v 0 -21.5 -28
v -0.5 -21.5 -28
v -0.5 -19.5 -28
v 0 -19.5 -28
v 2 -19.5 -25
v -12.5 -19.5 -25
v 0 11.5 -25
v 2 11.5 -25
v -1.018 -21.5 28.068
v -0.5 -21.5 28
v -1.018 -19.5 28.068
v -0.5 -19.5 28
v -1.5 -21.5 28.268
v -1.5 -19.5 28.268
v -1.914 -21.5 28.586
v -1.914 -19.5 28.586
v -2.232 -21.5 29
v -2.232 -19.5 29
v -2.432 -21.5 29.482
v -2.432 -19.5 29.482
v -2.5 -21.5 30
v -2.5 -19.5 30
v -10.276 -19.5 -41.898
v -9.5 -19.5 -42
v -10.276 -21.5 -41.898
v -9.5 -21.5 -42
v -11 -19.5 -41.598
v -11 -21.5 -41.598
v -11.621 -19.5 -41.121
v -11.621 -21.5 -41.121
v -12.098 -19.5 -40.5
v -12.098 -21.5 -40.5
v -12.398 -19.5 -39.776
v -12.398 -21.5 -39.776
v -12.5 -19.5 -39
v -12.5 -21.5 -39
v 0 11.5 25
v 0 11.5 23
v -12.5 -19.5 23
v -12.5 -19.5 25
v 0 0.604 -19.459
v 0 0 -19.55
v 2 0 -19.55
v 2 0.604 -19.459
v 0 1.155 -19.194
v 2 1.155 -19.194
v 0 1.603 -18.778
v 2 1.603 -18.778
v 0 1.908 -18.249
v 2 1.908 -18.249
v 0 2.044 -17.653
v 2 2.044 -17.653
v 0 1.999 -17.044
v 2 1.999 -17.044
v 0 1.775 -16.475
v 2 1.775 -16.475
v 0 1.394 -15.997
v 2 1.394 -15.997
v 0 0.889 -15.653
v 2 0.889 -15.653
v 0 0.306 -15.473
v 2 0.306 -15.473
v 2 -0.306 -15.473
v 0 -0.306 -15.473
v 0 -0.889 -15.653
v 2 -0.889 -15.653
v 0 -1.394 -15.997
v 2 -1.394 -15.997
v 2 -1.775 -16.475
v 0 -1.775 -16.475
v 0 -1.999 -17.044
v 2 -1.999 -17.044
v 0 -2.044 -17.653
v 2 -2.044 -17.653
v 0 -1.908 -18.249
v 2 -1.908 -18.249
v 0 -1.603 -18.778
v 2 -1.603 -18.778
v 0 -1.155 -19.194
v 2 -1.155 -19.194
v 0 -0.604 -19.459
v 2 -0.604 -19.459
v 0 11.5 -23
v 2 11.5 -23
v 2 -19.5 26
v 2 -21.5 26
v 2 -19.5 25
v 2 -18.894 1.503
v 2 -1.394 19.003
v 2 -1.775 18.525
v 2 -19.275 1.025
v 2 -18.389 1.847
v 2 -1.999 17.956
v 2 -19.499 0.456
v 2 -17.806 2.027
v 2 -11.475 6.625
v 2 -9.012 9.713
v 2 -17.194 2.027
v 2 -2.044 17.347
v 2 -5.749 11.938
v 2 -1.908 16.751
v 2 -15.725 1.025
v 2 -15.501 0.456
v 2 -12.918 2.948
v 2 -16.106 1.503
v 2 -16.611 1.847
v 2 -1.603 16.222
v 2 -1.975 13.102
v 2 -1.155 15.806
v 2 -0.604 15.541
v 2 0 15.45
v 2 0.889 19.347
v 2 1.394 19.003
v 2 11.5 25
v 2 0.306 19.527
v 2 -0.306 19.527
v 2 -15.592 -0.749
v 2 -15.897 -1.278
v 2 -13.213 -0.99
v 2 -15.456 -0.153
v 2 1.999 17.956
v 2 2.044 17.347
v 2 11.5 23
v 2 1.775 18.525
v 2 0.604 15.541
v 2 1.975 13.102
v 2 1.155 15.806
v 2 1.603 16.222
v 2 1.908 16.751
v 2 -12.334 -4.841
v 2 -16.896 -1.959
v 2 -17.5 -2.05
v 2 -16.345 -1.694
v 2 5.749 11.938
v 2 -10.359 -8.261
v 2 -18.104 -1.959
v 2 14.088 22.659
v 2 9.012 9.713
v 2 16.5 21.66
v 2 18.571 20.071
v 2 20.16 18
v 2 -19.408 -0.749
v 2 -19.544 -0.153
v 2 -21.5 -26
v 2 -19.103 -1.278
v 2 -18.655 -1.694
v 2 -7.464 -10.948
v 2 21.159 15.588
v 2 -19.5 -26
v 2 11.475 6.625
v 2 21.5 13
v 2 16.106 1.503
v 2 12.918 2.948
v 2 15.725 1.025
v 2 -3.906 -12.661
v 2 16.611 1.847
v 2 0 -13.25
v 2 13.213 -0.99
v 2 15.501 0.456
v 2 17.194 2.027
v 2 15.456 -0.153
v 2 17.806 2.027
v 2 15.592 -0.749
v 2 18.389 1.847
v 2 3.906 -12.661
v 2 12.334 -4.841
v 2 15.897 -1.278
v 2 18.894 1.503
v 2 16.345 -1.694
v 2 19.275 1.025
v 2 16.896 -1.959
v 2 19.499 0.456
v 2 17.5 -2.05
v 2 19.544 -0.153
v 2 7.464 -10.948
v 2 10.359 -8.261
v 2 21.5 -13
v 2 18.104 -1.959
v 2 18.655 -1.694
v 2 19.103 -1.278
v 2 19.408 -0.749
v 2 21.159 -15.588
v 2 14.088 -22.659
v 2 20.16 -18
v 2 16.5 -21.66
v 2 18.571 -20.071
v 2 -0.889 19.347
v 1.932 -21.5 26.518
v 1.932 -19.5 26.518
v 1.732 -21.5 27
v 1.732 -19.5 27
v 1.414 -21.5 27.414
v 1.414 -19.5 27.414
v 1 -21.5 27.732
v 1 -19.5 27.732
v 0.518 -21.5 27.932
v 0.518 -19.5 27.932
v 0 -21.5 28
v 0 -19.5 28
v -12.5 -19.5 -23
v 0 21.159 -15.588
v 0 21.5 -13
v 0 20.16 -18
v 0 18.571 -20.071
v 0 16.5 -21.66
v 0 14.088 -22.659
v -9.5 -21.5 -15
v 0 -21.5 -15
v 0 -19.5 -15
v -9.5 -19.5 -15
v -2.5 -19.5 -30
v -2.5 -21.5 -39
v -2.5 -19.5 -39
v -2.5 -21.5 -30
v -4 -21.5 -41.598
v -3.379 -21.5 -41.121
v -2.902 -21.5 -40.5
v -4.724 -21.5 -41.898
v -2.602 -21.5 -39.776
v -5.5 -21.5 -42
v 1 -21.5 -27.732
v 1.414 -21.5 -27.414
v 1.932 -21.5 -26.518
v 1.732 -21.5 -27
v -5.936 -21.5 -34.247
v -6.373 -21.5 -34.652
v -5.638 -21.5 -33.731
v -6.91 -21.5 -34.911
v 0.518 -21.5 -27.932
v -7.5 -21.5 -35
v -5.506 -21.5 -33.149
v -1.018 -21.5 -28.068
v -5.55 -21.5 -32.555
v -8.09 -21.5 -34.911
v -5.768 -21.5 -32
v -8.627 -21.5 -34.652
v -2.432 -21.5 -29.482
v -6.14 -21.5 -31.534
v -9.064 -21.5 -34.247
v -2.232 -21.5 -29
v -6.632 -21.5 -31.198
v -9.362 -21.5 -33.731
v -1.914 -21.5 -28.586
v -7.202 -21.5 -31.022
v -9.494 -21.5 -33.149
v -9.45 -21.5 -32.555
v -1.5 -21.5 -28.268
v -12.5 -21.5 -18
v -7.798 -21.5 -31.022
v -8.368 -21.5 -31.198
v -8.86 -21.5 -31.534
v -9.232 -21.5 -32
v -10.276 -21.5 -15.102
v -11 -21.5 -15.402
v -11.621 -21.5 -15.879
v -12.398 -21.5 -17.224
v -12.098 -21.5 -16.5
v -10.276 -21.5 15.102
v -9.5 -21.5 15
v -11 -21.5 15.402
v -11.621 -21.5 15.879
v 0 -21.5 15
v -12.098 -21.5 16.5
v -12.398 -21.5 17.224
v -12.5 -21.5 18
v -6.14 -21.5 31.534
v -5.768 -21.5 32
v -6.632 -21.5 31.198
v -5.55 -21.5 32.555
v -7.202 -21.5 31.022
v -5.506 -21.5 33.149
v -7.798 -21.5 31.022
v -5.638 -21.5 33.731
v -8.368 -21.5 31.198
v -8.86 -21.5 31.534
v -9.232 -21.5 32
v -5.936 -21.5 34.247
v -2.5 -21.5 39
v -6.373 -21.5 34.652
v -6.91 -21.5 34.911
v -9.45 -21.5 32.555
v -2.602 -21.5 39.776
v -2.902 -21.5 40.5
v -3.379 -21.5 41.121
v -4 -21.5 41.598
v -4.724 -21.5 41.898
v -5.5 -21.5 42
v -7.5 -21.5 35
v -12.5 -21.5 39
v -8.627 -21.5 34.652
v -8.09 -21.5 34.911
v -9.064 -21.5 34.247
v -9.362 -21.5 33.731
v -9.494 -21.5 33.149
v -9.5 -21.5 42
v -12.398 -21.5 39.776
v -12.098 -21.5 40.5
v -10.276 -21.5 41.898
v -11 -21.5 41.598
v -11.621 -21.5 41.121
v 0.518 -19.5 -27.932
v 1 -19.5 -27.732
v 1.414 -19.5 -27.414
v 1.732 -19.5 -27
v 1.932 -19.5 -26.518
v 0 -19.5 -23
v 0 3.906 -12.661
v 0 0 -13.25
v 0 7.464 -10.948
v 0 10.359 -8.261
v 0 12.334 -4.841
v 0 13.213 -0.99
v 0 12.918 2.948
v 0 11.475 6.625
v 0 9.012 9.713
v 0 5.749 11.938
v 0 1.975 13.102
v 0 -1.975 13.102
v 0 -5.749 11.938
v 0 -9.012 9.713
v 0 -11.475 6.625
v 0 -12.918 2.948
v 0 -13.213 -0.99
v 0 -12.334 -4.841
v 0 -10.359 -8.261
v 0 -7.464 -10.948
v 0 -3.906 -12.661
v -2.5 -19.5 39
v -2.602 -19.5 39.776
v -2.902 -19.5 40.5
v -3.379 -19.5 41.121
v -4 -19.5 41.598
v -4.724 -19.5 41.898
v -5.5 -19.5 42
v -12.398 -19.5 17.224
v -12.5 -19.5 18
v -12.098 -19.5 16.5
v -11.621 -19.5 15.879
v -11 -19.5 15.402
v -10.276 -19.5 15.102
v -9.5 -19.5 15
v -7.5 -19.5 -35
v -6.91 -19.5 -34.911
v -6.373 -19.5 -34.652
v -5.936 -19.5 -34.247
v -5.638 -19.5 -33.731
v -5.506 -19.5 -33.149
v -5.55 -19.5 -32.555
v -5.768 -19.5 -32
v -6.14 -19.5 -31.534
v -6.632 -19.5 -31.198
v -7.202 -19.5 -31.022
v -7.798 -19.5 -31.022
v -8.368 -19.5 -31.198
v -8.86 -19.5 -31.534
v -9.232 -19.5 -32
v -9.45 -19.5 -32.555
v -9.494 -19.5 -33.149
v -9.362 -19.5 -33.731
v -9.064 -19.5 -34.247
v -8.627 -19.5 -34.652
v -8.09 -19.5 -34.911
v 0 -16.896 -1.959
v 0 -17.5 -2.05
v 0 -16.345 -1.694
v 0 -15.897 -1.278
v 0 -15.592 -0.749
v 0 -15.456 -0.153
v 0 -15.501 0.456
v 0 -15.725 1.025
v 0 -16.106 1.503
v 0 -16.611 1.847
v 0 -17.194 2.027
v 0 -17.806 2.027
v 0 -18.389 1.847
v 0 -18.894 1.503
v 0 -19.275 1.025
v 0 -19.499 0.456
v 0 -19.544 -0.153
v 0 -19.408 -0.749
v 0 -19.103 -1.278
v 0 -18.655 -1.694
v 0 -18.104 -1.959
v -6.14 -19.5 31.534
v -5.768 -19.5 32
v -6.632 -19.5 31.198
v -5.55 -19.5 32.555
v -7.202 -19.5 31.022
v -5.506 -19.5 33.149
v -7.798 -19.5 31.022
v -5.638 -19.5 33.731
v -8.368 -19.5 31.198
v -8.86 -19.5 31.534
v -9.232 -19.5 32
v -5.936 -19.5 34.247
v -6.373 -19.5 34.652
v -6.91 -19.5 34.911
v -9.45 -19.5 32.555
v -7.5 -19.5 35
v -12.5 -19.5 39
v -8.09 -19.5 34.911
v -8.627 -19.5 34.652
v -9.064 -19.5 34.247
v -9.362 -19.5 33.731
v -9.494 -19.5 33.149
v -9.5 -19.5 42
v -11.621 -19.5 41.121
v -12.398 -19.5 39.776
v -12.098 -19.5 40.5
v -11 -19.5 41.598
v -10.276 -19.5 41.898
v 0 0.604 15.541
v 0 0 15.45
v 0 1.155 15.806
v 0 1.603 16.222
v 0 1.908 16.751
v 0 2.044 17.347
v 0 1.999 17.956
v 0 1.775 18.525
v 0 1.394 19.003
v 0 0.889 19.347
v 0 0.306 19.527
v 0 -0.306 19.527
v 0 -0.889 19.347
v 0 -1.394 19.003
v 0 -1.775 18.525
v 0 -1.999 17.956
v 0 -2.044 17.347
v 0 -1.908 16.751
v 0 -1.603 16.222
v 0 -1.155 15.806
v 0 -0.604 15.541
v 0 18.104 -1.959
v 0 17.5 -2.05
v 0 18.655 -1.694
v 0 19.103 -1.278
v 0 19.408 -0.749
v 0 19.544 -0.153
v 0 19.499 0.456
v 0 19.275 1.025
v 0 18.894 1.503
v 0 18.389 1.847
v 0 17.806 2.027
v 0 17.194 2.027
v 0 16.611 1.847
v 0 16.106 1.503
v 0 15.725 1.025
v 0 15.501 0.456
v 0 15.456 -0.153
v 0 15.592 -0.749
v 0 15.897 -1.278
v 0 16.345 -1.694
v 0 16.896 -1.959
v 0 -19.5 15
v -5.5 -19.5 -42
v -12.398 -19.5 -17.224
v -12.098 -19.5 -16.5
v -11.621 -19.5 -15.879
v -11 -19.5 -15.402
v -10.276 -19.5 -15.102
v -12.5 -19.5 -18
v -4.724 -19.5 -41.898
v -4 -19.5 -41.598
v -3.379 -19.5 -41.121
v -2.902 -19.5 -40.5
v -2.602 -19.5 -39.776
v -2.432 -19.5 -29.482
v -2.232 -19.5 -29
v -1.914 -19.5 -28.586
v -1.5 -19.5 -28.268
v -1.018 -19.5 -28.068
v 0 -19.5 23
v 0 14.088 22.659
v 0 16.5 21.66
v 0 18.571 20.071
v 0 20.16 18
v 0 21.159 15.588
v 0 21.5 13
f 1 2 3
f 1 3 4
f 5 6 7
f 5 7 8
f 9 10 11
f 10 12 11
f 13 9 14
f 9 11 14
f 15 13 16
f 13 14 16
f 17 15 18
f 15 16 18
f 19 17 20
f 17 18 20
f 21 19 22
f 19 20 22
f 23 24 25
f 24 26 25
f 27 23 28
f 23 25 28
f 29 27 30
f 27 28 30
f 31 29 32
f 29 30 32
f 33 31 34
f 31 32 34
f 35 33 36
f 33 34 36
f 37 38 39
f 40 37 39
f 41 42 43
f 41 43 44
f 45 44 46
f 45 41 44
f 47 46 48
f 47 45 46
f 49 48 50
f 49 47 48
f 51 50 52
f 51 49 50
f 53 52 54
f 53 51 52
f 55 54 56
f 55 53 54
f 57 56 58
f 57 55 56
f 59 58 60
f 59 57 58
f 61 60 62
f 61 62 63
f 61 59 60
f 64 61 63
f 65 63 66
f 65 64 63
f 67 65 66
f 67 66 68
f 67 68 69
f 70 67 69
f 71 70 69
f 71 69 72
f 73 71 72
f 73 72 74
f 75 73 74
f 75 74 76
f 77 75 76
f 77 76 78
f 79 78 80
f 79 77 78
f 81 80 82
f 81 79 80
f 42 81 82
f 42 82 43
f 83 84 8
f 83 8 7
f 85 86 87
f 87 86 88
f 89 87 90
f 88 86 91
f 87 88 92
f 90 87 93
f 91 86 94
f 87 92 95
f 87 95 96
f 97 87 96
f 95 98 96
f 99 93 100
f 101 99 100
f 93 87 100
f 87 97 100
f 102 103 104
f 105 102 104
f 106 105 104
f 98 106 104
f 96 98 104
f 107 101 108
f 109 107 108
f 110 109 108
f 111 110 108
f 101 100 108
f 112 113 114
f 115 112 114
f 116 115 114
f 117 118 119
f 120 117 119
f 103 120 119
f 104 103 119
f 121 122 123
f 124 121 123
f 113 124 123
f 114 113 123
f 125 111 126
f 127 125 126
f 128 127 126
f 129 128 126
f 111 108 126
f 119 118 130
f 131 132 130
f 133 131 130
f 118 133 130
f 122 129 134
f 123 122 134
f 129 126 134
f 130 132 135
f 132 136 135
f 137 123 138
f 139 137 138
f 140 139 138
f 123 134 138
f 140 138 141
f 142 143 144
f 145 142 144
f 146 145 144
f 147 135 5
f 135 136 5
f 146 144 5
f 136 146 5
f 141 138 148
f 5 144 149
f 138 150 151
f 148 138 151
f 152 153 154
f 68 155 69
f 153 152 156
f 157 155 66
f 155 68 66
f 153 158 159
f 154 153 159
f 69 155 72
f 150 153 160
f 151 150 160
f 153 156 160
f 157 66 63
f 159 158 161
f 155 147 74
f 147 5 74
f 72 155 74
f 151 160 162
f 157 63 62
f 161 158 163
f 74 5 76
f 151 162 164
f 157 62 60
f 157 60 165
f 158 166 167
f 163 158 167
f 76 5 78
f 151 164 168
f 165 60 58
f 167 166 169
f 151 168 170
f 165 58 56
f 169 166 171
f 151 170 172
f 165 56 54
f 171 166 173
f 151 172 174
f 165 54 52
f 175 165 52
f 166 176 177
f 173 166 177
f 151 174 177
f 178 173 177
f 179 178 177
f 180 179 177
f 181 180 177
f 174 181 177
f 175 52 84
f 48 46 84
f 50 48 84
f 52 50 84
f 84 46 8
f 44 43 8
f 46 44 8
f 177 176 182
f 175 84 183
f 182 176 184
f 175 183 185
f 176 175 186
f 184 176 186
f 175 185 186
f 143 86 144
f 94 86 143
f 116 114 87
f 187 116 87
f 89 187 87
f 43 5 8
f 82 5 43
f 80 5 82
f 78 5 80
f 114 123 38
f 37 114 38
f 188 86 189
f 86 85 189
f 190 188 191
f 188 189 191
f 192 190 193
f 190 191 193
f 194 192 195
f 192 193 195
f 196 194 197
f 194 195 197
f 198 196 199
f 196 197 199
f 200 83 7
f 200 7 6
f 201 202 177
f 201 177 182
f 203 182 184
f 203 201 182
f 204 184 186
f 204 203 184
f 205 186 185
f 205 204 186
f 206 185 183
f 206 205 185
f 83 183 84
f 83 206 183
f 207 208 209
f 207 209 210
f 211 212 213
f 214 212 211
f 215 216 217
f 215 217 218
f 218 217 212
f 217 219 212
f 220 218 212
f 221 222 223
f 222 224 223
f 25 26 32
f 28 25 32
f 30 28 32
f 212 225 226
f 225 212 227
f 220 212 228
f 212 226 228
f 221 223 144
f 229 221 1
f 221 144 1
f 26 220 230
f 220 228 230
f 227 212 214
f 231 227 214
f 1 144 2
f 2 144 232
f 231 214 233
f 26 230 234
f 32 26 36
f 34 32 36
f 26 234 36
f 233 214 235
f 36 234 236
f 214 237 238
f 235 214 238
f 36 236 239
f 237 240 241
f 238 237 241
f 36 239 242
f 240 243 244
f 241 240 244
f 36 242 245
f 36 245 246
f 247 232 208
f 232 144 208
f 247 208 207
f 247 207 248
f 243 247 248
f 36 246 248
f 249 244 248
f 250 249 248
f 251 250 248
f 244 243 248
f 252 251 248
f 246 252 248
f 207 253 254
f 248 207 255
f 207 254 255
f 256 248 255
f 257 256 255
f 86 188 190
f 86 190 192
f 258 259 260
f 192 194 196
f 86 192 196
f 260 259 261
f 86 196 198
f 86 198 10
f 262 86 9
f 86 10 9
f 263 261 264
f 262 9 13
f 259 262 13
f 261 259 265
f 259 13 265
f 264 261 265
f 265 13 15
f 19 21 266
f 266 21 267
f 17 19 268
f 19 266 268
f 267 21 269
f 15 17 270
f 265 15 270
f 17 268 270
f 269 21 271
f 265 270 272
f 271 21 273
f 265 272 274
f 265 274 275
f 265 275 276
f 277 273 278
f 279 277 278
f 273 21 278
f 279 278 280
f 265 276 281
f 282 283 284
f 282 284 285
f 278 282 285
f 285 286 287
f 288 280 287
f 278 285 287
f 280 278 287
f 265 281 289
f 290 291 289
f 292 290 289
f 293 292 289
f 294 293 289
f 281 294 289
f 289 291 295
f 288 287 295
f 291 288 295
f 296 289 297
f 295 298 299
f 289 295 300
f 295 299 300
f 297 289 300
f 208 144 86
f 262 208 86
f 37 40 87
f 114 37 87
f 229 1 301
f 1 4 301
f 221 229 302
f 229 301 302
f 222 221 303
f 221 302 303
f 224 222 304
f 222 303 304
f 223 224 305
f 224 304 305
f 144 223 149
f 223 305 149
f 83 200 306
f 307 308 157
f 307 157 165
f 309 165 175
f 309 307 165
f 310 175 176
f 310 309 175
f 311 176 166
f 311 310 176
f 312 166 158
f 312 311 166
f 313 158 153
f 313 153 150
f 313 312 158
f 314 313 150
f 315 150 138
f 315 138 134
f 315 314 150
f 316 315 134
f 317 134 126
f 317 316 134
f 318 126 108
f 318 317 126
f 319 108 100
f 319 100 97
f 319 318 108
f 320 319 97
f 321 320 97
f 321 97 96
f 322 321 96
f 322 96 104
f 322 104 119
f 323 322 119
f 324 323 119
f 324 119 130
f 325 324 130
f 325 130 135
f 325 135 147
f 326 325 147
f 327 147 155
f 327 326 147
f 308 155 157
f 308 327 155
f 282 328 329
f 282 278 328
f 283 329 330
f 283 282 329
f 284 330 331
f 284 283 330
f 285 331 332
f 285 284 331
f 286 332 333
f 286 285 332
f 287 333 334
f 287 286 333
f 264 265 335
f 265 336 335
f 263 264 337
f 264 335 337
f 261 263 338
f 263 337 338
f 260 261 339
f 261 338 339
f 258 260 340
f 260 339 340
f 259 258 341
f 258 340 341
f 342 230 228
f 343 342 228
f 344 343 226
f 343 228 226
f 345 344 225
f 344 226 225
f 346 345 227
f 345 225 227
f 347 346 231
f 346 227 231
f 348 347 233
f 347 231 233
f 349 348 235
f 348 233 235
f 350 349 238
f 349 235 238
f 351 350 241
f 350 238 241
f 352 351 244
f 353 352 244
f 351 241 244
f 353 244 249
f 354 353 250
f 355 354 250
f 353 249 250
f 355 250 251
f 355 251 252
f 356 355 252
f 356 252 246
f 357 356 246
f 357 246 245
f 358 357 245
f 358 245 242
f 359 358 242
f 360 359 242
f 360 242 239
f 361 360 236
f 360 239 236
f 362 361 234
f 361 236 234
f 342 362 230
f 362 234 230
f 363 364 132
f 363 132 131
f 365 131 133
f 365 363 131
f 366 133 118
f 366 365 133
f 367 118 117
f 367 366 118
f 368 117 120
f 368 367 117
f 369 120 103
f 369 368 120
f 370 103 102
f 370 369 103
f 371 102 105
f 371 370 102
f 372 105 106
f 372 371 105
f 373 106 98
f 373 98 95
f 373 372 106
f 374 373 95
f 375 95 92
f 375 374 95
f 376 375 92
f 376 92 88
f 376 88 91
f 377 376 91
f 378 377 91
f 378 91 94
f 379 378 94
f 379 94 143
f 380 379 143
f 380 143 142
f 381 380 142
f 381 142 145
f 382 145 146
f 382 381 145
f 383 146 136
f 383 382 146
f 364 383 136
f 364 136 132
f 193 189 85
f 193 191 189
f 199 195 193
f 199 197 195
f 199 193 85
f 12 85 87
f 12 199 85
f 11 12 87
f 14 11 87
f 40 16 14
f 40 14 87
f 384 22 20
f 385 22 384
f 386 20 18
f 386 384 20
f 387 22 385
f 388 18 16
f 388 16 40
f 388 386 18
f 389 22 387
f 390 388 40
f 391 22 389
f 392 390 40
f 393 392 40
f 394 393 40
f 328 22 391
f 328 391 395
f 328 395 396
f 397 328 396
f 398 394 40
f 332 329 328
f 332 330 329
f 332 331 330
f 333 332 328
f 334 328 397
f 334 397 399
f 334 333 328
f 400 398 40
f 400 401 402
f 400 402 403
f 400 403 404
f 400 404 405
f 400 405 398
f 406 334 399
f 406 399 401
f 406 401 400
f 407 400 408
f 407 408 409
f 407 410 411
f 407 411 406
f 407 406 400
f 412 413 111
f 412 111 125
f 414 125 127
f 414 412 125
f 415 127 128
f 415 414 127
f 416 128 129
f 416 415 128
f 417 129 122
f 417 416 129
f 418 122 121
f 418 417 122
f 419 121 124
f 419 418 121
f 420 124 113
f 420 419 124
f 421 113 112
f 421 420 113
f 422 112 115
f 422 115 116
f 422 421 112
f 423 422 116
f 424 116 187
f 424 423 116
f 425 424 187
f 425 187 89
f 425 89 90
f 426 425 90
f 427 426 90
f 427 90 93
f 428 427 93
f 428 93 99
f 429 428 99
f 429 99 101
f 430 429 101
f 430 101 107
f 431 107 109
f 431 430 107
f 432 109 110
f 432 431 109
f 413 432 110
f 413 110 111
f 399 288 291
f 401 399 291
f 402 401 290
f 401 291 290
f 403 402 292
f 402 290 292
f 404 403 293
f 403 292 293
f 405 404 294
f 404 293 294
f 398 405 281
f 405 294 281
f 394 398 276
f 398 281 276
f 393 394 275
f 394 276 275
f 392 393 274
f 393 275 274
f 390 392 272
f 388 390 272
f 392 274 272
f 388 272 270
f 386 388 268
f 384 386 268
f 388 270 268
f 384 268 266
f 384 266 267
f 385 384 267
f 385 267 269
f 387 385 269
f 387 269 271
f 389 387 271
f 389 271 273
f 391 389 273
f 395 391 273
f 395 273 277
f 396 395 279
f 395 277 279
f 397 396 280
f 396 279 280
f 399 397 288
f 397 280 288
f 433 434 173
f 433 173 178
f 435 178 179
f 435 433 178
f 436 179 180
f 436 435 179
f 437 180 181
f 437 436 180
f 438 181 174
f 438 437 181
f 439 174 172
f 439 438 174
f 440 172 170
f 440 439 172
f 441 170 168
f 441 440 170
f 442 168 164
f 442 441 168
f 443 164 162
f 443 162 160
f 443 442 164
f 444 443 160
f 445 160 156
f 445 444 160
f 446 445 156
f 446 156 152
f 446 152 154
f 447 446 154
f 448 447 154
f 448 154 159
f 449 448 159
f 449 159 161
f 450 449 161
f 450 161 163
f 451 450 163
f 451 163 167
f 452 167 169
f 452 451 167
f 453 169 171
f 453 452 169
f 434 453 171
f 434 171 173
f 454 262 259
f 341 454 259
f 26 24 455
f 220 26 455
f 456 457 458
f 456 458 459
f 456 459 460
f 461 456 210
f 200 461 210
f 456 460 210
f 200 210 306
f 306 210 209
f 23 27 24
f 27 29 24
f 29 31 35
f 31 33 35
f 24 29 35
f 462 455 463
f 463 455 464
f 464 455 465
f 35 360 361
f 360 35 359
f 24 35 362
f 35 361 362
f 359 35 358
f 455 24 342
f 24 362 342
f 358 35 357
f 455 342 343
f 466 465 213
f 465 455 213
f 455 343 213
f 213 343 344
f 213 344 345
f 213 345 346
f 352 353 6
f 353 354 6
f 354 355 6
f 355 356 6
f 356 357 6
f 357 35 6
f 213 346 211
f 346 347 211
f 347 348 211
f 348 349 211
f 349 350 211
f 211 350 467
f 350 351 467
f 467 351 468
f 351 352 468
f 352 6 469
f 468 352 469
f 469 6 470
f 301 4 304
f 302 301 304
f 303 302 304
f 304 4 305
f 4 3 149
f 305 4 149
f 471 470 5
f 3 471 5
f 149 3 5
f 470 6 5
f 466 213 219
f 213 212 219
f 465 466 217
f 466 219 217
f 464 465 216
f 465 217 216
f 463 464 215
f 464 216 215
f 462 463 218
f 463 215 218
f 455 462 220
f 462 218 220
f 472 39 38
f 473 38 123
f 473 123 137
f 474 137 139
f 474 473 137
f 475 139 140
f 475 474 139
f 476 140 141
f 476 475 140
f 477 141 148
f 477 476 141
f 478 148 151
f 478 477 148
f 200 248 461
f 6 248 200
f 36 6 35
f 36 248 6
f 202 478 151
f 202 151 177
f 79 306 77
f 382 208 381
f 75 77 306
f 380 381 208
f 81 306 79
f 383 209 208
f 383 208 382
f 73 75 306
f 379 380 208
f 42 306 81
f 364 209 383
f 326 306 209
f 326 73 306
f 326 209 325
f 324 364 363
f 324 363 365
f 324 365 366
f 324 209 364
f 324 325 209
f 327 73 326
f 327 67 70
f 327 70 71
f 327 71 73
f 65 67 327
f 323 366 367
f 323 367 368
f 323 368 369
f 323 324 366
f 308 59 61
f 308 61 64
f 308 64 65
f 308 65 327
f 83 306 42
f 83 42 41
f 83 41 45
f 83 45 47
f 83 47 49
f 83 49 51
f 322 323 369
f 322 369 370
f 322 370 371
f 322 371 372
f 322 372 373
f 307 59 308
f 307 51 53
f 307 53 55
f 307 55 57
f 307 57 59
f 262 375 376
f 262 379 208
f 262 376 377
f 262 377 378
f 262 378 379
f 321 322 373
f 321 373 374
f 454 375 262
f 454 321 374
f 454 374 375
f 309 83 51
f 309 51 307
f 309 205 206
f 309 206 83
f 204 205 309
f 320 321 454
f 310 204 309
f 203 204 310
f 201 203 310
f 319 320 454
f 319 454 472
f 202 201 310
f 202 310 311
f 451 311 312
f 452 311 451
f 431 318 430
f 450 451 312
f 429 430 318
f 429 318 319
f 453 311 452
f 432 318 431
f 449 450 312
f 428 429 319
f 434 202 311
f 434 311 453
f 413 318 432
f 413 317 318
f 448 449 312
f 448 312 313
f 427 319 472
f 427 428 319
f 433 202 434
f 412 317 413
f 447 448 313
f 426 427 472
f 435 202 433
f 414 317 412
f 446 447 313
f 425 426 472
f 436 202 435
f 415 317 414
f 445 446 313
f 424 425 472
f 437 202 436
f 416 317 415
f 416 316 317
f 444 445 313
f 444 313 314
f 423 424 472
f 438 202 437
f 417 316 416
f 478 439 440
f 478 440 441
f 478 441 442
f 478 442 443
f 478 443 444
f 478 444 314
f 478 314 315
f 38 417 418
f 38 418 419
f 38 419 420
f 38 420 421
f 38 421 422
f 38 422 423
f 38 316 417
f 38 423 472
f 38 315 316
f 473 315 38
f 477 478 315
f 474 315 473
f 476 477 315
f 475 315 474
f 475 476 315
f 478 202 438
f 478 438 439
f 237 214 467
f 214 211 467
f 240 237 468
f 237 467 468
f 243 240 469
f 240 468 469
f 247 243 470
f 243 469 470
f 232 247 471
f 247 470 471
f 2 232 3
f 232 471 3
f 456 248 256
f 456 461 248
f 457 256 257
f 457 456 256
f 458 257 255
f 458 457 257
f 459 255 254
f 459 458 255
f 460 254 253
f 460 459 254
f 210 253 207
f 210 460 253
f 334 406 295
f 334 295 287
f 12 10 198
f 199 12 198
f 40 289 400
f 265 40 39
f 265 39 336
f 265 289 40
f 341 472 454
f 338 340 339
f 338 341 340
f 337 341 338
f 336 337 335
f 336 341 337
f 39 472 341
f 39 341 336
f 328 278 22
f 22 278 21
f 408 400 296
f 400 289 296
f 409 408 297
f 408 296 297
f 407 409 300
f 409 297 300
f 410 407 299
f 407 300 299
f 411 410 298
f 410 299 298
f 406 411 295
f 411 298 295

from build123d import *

# Parameters (mm, degrees)
SKETCH1_R           = 13.25
SKETCH1_R_2         = 2.05
BOSS_EXTRUDE1_DEPTH = 2
SKETCH2_R           = 2
BOSS_EXTRUDE2_DEPTH = 2
BOSS_EXTRUDE3_DEPTH = 2
BOSS_EXTRUDE4_DEPTH = 2
SKETCH6_W           = 10
SKETCH6_H           = 5
CUT_EXTRUDE2_DEPTH  = 2
FILLET1_R           = 3
FILLET_1_R          = 2
FILLET_2_R          = 3


with BuildPart() as part:
    # Sketch1 → Boss-Extrude1 (new body)
    with BuildSketch(Plane(origin=(0, 0, 0), x_dir=(0, 0, -1), z_dir=(1, 0, 0))):
        with BuildLine():
            Line((-13, 21.5), (13, 21.5))
            ThreePointArc((13, 21.5), (20.071067812, 18.571067812), (23, 11.5))
            Line((23, 11.5), (23, -21.5))
            Line((23, -21.5), (-23, -21.5))
            Line((-23, -21.5), (-23, 11.5))
            ThreePointArc((-23, 11.5), (-20.071067812, 18.571067812), (-13, 21.5))
        make_face()
        Circle(SKETCH1_R, mode=Mode.SUBTRACT)
        with Locations((0, 17.5)):
            Circle(SKETCH1_R_2, mode=Mode.SUBTRACT)
        with Locations((17.5, 0)):
            Circle(SKETCH1_R_2, mode=Mode.SUBTRACT)
        with Locations((0, -17.5)):
            Circle(SKETCH1_R_2, mode=Mode.SUBTRACT)
        with Locations((-17.5, 0)):
            Circle(SKETCH1_R_2, mode=Mode.SUBTRACT)
    extrude(amount=BOSS_EXTRUDE1_DEPTH)

    # Sketch2 → Boss-Extrude2 (add)
    # profile 1 of 2: a face of its own
    with BuildSketch(Plane.XZ.offset(21.5)):
        Polygon((-12.5, 23), (-12.5, 47), (-2.5, 47), (-2.5, 28), (2, 28), (2, 23), (0, 23), (0, 15), (-12.5, 15), align=None)
        with Locations(Location((-7.5, 33, 0), (0, 0, 90))):
            Circle(SKETCH2_R, mode=Mode.SUBTRACT)
    # profile 2 of 2: a face of its own
    with BuildSketch(Plane.XZ.offset(21.5)):
        Polygon((2, -23), (0, -23), (0, -15), (-12.5, -15), (-12.5, -23), (-12.5, -47), (-2.5, -47), (-2.5, -28), (2, -28), align=None)
        with Locations(Location((-7.5, -33, 0), (0, 0, 270))):
            Circle(SKETCH2_R, mode=Mode.SUBTRACT)
    extrude(amount=-BOSS_EXTRUDE2_DEPTH)

    # Sketch3 → Boss-Extrude3 (add)
    with BuildSketch(Plane(origin=(0, 0, -23), x_dir=(-1, 0, 0), z_dir=(0, 0, -1))):
        Polygon((-2, 11.5), (0, 11.5), (12.5, -19.5), (7.5, -19.5), (-2, -19.55), align=None)
    extrude(amount=BOSS_EXTRUDE3_DEPTH)

    # Sketch4 → Boss-Extrude4 (add)
    with BuildSketch(Plane.XY.offset(23)):
        Polygon((2, 11.5), (0, 11.5), (-12.5, -19.5), (2, -19.5), align=None)
    extrude(amount=BOSS_EXTRUDE4_DEPTH)

    # Sketch6 → Cut-Extrude2 (cut)
    with BuildSketch(Plane(origin=(0, -19.5, 0), x_dir=(1, 0, 0), z_dir=(0, 1, 0))):
        with Locations((-7.5, 44.5)):
            Rectangle(SKETCH6_W, SKETCH6_H)
        with Locations((-7.5, -44.5)):
            Rectangle(SKETCH6_W, SKETCH6_H)
    extrude(amount=-CUT_EXTRUDE2_DEPTH, mode=Mode.SUBTRACT)

    # Fillet1
    fillet1_edges = [part.edges().sort_by_distance(p)[0] for p in [
        (-2.5, -20.5, -42),
        (-12.5, -20.5, -42),
        (-12.5, -20.5, 42),
        (-2.5, -20.5, 42),
    ]]
    fillet(fillet1_edges, radius=FILLET1_R)

    # 圆角1
    fillet_1_edges = [part.edges().sort_by_distance(p)[0] for p in [
        (2, -20.5, -28),
        (-2.5, -20.5, -28),
        (-2.5, -20.5, 28),
        (2, -20.5, 28),
    ]]
    fillet(fillet_1_edges, radius=FILLET_1_R)

    # 圆角2
    fillet_2_edges = [part.edges().sort_by_distance(p)[0] for p in [
        (-12.5, -20.5, -15),
        (-12.5, -20.5, 15),
    ]]
    fillet(fillet_2_edges, radius=FILLET_2_R)


solid = part.part
